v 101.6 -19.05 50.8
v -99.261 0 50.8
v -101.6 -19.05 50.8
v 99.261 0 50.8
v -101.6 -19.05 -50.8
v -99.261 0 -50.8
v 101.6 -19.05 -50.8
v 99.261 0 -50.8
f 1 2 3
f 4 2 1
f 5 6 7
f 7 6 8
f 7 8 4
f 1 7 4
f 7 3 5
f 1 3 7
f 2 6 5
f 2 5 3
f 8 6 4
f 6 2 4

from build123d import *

# Parameters (mm, degrees)
F0_W     = 203.2
F0_H     = 101.6
F1_DEPTH = 19.05
F2_SIZE2 = 2.339036
F2_SIZE  = 19.04999
F3_SIZE2 = 2.339036
F3_SIZE  = 19.04999


# Not quite as in the source:
# - a fillet or chamfer is up to 0.001 mm smaller than in the source, because OpenCascade refuses the exact size


with BuildPart() as f1:
    # F0 (on Front) → F1 (new body)
    with BuildSketch(Plane.XZ):
        Rectangle(F0_W, F0_H)
    extrude(amount=F1_DEPTH)

    # F2 (size 19.05 and 2.3390458852 in the source; OpenCascade refuses exactly that, so slightly less here)
    f2_edges = [f1.edges().sort_by_distance(p)[0] for p in [
        (-101.6, 0, 0),
    ]]
    f2_side = f1.faces().sort_by_distance((-101.6, -9.525, 0))[0]
    chamfer(f2_edges, length=F2_SIZE, length2=F2_SIZE2, reference=f2_side)

    # F3 (size 19.05 and 2.3390458852 in the source; OpenCascade refuses exactly that, so slightly less here)
    f3_edges = [f1.edges().sort_by_distance(p)[0] for p in [
        (101.6, 0, 0),
    ]]
    f3_side = f1.faces().sort_by_distance((101.6, -9.525, 0))[0]
    chamfer(f3_edges, length=F3_SIZE, length2=F3_SIZE2, reference=f3_side)


solid = f1.part
